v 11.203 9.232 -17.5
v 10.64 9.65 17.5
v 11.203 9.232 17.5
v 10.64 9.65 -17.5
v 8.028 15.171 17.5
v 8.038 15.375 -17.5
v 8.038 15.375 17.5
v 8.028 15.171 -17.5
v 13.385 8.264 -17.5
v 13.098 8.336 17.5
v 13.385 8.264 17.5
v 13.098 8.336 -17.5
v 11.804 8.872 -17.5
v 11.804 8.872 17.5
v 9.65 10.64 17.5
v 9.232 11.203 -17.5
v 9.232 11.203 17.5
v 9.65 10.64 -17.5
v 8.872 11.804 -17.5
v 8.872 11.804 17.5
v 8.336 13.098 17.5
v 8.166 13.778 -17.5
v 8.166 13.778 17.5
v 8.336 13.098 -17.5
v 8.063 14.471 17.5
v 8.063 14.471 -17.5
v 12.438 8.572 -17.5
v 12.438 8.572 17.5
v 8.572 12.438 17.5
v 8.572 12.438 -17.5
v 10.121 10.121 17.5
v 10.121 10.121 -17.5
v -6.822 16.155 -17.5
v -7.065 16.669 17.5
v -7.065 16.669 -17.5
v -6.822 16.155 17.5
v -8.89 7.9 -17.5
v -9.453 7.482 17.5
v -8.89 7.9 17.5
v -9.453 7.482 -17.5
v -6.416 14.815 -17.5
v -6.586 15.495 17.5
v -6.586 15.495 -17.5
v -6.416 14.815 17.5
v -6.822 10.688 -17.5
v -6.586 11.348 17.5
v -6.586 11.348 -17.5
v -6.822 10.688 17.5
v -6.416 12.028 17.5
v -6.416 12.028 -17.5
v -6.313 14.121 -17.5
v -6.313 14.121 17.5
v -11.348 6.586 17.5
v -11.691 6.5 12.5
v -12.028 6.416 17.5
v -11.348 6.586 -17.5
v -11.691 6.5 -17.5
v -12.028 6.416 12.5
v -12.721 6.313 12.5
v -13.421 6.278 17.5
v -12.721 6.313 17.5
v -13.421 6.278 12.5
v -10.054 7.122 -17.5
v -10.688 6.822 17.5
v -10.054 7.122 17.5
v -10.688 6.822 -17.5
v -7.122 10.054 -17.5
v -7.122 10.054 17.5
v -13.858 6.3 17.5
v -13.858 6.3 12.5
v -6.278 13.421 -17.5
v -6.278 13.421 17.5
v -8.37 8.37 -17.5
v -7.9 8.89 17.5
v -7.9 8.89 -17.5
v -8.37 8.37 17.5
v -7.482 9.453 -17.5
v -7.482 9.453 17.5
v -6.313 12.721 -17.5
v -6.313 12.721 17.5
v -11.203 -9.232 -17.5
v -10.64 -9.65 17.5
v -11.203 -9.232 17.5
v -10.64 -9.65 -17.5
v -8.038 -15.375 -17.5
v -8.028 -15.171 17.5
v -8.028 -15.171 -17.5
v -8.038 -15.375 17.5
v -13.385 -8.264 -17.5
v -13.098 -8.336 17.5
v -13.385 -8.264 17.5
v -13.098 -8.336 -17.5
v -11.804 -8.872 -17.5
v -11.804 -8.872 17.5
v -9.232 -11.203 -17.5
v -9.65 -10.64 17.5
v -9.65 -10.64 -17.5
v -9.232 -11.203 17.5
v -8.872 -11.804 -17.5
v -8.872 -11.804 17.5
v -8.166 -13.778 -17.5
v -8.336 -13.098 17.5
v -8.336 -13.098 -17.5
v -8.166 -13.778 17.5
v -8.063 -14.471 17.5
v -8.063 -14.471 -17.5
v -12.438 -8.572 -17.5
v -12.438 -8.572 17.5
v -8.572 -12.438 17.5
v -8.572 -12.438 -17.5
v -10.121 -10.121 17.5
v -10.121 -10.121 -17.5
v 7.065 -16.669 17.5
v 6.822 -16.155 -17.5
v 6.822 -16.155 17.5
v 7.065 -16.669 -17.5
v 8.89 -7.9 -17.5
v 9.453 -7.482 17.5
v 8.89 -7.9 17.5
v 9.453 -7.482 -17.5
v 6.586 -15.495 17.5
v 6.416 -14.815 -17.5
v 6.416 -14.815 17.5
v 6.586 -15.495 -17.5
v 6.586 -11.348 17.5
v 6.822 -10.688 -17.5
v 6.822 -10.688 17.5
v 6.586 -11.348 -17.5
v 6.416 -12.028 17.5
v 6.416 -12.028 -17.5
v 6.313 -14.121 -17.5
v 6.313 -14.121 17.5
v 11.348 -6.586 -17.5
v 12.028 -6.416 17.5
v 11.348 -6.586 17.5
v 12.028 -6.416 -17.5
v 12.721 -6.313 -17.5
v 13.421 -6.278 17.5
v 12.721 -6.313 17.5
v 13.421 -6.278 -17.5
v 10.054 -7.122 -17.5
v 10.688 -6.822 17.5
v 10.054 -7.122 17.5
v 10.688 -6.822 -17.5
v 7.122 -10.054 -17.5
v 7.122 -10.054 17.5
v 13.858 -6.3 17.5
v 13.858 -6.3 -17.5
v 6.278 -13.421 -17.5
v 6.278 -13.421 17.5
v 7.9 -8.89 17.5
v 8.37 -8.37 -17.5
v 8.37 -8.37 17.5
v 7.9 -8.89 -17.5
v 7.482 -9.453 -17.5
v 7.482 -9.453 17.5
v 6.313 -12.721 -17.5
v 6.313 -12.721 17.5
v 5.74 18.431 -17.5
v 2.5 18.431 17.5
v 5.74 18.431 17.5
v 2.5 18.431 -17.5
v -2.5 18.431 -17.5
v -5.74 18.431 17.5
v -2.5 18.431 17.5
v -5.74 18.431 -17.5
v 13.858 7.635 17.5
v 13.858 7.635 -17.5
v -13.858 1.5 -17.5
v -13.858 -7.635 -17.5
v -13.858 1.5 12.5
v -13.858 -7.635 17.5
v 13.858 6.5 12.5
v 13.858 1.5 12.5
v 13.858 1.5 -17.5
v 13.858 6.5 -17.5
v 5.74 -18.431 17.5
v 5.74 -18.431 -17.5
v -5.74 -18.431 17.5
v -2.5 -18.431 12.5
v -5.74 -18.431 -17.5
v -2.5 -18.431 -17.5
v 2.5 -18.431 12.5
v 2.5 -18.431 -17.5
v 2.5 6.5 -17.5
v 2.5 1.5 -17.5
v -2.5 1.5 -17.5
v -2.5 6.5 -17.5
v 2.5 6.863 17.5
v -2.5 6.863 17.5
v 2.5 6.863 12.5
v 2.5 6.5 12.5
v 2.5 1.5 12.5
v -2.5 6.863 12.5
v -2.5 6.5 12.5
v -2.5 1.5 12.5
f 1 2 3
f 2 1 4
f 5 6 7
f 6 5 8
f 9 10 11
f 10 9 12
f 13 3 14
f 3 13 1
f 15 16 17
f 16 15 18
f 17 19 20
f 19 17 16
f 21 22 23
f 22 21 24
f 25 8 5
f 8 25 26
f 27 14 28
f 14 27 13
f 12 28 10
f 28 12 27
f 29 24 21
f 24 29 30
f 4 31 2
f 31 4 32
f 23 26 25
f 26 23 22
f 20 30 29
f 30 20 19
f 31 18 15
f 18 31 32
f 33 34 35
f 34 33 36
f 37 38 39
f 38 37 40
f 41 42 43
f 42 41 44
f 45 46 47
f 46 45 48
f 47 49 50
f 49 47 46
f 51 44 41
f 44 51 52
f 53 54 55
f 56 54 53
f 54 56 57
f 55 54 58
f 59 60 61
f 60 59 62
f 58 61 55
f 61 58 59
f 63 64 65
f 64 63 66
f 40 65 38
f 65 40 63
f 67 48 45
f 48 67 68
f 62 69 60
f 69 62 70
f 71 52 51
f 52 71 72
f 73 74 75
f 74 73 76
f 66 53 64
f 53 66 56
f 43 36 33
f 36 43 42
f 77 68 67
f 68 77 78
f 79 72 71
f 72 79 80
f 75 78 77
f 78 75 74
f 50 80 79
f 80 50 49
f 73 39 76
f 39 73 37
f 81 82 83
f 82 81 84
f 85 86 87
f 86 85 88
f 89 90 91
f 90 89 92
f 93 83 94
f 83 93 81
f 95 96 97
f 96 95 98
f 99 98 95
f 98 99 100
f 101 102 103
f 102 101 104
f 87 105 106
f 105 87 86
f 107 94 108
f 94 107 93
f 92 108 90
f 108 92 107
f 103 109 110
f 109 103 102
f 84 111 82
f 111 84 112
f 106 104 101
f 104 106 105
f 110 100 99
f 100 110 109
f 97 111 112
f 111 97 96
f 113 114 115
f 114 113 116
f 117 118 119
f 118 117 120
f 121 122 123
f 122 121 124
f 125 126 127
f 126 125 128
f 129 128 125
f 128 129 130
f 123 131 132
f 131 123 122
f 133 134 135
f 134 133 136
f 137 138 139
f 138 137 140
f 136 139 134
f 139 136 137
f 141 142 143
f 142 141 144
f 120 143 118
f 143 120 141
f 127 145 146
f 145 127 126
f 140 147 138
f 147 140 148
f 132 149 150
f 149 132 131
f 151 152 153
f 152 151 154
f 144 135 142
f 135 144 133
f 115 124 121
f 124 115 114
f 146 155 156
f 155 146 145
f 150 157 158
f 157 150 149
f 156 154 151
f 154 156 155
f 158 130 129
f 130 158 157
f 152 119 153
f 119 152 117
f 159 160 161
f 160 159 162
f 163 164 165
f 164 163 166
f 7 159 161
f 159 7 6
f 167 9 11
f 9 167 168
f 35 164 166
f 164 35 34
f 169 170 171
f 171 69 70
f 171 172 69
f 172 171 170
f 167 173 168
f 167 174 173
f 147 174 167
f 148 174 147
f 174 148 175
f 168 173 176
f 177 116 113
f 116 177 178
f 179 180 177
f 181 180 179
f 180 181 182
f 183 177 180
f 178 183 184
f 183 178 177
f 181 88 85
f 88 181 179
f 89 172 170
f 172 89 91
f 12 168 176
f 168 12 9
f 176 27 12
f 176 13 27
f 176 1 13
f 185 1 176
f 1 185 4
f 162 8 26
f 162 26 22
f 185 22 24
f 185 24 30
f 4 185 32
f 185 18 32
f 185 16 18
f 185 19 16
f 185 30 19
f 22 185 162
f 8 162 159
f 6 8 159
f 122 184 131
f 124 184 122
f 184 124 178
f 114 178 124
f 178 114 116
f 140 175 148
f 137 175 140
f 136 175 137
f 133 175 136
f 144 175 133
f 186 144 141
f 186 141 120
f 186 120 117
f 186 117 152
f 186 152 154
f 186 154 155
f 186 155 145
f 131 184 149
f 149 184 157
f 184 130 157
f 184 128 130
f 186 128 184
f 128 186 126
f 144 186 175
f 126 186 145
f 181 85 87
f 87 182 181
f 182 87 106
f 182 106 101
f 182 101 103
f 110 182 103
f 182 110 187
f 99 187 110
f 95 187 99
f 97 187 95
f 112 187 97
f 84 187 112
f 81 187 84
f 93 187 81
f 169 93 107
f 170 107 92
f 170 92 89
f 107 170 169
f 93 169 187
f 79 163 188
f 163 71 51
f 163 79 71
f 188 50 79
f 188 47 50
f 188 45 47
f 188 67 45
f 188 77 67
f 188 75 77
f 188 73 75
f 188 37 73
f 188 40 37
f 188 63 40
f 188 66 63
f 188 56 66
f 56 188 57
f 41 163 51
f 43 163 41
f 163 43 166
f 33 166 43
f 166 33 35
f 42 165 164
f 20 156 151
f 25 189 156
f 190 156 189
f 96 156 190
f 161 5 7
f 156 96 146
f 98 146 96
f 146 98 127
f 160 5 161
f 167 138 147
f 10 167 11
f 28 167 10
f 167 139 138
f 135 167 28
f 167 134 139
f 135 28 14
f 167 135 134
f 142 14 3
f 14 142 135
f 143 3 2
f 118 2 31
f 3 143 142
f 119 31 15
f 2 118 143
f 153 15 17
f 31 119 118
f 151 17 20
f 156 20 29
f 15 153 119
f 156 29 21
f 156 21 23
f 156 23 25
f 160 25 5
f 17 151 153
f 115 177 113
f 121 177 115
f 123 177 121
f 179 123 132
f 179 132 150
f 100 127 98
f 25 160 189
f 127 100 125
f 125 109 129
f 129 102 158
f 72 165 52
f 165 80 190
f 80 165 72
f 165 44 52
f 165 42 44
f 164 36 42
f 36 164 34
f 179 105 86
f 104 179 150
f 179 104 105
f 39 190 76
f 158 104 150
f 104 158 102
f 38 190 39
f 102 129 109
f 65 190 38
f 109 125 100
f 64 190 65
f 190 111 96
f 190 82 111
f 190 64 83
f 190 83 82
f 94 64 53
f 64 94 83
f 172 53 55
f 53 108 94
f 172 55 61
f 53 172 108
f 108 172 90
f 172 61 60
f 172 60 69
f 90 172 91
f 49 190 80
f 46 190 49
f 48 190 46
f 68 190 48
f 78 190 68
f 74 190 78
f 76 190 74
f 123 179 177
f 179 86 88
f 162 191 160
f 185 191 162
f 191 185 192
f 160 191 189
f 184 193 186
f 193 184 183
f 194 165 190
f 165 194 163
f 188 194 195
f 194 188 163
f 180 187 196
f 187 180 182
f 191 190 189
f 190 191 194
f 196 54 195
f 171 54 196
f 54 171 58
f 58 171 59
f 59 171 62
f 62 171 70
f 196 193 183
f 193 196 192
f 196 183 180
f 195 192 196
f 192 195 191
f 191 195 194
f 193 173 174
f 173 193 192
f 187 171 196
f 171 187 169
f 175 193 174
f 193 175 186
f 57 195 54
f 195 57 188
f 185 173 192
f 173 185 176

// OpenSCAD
module cap(h, d) {
  difference() {
    rotate([0, 0, 22.5])
      cylinder(d = d, h = h, center = true, $fn = 8);

    translate([0, d * cos(22.5), 0])
      cube([5, d * 1.5, h + 2], center = true);
    
    translate([0, -d / 2, 0])
      cube([d * 1.5, d, h + 2], center = true);
   
    rotate([0, 0, 45])
      translate([sin(22.5) * (d) + (d / 4), 0, 0])
        cylinder(d = d / 2.2, h = h + 2, center = true, $fn = 64);
    
    rotate([0, 0, 135])
      translate([sin(22.5) * (d) + (d / 4), 0, 0])
        cylinder(d = d / 2.2, h = h + 2, center = true, $fn = 64);
  }
}

module tee(h, d, cut = 5) {
  difference() {
    scale([1, 1.33, 1])
      rotate([0, 0, 22.5])
        cylinder(d = d, h = h, center = true, $fn = 8);

    for (i = [0 : 180 : 0])
      rotate([0, 0, i])
        translate([0, d * cos(22.5) * 1.33 - d/2, 0])
          cube([5, d, h + 2], center = true);
      
    rotate([0, 0, 90])
      translate([d  / -2 + .51,  0, 0])
        cube([2 + d, d * 1.5, h + 2], center = true);

    rotate([0, 0, 0])
      translate([0, 0, cut / -2 - 1])
        cube([5, d * 1.5, h  + 2 - cut], center = true);

    rotate([0, 0, 90])
      translate([4, 0, cut / -2 - 1])
        cube([5, d * 1.5, h  + 2 - cut], center = true);

    for (i = [0 : 180 : 180])
      rotate([0, 0, i]) {
        rotate([0, 0, 45])
          translate([sin(22.5) * (d) + (d / 4), 0, 0])
            cylinder(d = d / 2.1, h = h + 2, center = true, $fn = 64);
        
        rotate([0, 0, 135])
          translate([sin(22.5) * (d) + (d / 4), 0, 0])
            cylinder(d = d / 2.1, h = h + 2, center = true, $fn = 64);
      }
  }
}

module corner(h, d, cut = 5) {
  difference() {
    scale([1, 1.33, 1])
      rotate([0, 0, 22.5])
        cylinder(d = d, h = h, center = true, $fn = 8);

    for (i = [0 : 180 : 0])
      rotate([0, 0, i])
        translate([0, d * cos(22.5) * 1.33 - d/2, 0])
          cube([5, d, h + 2], center = true);
      
    *rotate([0, 0, 90])
      translate([1.33 * -d / 2  * cos(22.5) + 5,  0, 0])
        cube([d, d * 1.5, h + 2], center = true);
    
    *rotate([0, 0, 180])
      translate([d  / -2 - 2.5 - 1 + 0.1,  0, 0])
        cube([2 + d, d * 1.5, h + 2], center = true);


    rotate([0, 0, 0])
      translate([0, 0, cut / -2 - 1])
        cube([5, d * 1.5, h  + 2 - cut], center = true);

    rotate([0, 0, 90])
      translate([4, 0, cut / -2 - 1])
        cube([5, d * 1.5, h  + 2 - cut], center = true);
 
    #for (i = [0 : 180 : 180])
      rotate([0, 0, i]) {
        rotate([0, 0, 45])
          translate([sin(22.5) * (d) + (d * 1.33 / 4), 0, 0])
            cylinder(d = d / 2.1, h = h + 2, center = true, $fn = 64);
        
        rotate([0, 0, 135])
          translate([sin(22.5) * (d) + (d / 4), 0, 0])
            cylinder(d = d / 2.1, h = h + 2, center = true, $fn = 64);
      }
  }
}

h = 35;
d = 30;

corner(h, d);            

*translate([0, 1, -h / 2])
  cube([255, 3, h]);

*for(i = [0 : 1 : 3])
  translate([(51 + (cos(22.5) * 7.5)) + i * 51, 1.5, 0])
    cap(h, 15);
